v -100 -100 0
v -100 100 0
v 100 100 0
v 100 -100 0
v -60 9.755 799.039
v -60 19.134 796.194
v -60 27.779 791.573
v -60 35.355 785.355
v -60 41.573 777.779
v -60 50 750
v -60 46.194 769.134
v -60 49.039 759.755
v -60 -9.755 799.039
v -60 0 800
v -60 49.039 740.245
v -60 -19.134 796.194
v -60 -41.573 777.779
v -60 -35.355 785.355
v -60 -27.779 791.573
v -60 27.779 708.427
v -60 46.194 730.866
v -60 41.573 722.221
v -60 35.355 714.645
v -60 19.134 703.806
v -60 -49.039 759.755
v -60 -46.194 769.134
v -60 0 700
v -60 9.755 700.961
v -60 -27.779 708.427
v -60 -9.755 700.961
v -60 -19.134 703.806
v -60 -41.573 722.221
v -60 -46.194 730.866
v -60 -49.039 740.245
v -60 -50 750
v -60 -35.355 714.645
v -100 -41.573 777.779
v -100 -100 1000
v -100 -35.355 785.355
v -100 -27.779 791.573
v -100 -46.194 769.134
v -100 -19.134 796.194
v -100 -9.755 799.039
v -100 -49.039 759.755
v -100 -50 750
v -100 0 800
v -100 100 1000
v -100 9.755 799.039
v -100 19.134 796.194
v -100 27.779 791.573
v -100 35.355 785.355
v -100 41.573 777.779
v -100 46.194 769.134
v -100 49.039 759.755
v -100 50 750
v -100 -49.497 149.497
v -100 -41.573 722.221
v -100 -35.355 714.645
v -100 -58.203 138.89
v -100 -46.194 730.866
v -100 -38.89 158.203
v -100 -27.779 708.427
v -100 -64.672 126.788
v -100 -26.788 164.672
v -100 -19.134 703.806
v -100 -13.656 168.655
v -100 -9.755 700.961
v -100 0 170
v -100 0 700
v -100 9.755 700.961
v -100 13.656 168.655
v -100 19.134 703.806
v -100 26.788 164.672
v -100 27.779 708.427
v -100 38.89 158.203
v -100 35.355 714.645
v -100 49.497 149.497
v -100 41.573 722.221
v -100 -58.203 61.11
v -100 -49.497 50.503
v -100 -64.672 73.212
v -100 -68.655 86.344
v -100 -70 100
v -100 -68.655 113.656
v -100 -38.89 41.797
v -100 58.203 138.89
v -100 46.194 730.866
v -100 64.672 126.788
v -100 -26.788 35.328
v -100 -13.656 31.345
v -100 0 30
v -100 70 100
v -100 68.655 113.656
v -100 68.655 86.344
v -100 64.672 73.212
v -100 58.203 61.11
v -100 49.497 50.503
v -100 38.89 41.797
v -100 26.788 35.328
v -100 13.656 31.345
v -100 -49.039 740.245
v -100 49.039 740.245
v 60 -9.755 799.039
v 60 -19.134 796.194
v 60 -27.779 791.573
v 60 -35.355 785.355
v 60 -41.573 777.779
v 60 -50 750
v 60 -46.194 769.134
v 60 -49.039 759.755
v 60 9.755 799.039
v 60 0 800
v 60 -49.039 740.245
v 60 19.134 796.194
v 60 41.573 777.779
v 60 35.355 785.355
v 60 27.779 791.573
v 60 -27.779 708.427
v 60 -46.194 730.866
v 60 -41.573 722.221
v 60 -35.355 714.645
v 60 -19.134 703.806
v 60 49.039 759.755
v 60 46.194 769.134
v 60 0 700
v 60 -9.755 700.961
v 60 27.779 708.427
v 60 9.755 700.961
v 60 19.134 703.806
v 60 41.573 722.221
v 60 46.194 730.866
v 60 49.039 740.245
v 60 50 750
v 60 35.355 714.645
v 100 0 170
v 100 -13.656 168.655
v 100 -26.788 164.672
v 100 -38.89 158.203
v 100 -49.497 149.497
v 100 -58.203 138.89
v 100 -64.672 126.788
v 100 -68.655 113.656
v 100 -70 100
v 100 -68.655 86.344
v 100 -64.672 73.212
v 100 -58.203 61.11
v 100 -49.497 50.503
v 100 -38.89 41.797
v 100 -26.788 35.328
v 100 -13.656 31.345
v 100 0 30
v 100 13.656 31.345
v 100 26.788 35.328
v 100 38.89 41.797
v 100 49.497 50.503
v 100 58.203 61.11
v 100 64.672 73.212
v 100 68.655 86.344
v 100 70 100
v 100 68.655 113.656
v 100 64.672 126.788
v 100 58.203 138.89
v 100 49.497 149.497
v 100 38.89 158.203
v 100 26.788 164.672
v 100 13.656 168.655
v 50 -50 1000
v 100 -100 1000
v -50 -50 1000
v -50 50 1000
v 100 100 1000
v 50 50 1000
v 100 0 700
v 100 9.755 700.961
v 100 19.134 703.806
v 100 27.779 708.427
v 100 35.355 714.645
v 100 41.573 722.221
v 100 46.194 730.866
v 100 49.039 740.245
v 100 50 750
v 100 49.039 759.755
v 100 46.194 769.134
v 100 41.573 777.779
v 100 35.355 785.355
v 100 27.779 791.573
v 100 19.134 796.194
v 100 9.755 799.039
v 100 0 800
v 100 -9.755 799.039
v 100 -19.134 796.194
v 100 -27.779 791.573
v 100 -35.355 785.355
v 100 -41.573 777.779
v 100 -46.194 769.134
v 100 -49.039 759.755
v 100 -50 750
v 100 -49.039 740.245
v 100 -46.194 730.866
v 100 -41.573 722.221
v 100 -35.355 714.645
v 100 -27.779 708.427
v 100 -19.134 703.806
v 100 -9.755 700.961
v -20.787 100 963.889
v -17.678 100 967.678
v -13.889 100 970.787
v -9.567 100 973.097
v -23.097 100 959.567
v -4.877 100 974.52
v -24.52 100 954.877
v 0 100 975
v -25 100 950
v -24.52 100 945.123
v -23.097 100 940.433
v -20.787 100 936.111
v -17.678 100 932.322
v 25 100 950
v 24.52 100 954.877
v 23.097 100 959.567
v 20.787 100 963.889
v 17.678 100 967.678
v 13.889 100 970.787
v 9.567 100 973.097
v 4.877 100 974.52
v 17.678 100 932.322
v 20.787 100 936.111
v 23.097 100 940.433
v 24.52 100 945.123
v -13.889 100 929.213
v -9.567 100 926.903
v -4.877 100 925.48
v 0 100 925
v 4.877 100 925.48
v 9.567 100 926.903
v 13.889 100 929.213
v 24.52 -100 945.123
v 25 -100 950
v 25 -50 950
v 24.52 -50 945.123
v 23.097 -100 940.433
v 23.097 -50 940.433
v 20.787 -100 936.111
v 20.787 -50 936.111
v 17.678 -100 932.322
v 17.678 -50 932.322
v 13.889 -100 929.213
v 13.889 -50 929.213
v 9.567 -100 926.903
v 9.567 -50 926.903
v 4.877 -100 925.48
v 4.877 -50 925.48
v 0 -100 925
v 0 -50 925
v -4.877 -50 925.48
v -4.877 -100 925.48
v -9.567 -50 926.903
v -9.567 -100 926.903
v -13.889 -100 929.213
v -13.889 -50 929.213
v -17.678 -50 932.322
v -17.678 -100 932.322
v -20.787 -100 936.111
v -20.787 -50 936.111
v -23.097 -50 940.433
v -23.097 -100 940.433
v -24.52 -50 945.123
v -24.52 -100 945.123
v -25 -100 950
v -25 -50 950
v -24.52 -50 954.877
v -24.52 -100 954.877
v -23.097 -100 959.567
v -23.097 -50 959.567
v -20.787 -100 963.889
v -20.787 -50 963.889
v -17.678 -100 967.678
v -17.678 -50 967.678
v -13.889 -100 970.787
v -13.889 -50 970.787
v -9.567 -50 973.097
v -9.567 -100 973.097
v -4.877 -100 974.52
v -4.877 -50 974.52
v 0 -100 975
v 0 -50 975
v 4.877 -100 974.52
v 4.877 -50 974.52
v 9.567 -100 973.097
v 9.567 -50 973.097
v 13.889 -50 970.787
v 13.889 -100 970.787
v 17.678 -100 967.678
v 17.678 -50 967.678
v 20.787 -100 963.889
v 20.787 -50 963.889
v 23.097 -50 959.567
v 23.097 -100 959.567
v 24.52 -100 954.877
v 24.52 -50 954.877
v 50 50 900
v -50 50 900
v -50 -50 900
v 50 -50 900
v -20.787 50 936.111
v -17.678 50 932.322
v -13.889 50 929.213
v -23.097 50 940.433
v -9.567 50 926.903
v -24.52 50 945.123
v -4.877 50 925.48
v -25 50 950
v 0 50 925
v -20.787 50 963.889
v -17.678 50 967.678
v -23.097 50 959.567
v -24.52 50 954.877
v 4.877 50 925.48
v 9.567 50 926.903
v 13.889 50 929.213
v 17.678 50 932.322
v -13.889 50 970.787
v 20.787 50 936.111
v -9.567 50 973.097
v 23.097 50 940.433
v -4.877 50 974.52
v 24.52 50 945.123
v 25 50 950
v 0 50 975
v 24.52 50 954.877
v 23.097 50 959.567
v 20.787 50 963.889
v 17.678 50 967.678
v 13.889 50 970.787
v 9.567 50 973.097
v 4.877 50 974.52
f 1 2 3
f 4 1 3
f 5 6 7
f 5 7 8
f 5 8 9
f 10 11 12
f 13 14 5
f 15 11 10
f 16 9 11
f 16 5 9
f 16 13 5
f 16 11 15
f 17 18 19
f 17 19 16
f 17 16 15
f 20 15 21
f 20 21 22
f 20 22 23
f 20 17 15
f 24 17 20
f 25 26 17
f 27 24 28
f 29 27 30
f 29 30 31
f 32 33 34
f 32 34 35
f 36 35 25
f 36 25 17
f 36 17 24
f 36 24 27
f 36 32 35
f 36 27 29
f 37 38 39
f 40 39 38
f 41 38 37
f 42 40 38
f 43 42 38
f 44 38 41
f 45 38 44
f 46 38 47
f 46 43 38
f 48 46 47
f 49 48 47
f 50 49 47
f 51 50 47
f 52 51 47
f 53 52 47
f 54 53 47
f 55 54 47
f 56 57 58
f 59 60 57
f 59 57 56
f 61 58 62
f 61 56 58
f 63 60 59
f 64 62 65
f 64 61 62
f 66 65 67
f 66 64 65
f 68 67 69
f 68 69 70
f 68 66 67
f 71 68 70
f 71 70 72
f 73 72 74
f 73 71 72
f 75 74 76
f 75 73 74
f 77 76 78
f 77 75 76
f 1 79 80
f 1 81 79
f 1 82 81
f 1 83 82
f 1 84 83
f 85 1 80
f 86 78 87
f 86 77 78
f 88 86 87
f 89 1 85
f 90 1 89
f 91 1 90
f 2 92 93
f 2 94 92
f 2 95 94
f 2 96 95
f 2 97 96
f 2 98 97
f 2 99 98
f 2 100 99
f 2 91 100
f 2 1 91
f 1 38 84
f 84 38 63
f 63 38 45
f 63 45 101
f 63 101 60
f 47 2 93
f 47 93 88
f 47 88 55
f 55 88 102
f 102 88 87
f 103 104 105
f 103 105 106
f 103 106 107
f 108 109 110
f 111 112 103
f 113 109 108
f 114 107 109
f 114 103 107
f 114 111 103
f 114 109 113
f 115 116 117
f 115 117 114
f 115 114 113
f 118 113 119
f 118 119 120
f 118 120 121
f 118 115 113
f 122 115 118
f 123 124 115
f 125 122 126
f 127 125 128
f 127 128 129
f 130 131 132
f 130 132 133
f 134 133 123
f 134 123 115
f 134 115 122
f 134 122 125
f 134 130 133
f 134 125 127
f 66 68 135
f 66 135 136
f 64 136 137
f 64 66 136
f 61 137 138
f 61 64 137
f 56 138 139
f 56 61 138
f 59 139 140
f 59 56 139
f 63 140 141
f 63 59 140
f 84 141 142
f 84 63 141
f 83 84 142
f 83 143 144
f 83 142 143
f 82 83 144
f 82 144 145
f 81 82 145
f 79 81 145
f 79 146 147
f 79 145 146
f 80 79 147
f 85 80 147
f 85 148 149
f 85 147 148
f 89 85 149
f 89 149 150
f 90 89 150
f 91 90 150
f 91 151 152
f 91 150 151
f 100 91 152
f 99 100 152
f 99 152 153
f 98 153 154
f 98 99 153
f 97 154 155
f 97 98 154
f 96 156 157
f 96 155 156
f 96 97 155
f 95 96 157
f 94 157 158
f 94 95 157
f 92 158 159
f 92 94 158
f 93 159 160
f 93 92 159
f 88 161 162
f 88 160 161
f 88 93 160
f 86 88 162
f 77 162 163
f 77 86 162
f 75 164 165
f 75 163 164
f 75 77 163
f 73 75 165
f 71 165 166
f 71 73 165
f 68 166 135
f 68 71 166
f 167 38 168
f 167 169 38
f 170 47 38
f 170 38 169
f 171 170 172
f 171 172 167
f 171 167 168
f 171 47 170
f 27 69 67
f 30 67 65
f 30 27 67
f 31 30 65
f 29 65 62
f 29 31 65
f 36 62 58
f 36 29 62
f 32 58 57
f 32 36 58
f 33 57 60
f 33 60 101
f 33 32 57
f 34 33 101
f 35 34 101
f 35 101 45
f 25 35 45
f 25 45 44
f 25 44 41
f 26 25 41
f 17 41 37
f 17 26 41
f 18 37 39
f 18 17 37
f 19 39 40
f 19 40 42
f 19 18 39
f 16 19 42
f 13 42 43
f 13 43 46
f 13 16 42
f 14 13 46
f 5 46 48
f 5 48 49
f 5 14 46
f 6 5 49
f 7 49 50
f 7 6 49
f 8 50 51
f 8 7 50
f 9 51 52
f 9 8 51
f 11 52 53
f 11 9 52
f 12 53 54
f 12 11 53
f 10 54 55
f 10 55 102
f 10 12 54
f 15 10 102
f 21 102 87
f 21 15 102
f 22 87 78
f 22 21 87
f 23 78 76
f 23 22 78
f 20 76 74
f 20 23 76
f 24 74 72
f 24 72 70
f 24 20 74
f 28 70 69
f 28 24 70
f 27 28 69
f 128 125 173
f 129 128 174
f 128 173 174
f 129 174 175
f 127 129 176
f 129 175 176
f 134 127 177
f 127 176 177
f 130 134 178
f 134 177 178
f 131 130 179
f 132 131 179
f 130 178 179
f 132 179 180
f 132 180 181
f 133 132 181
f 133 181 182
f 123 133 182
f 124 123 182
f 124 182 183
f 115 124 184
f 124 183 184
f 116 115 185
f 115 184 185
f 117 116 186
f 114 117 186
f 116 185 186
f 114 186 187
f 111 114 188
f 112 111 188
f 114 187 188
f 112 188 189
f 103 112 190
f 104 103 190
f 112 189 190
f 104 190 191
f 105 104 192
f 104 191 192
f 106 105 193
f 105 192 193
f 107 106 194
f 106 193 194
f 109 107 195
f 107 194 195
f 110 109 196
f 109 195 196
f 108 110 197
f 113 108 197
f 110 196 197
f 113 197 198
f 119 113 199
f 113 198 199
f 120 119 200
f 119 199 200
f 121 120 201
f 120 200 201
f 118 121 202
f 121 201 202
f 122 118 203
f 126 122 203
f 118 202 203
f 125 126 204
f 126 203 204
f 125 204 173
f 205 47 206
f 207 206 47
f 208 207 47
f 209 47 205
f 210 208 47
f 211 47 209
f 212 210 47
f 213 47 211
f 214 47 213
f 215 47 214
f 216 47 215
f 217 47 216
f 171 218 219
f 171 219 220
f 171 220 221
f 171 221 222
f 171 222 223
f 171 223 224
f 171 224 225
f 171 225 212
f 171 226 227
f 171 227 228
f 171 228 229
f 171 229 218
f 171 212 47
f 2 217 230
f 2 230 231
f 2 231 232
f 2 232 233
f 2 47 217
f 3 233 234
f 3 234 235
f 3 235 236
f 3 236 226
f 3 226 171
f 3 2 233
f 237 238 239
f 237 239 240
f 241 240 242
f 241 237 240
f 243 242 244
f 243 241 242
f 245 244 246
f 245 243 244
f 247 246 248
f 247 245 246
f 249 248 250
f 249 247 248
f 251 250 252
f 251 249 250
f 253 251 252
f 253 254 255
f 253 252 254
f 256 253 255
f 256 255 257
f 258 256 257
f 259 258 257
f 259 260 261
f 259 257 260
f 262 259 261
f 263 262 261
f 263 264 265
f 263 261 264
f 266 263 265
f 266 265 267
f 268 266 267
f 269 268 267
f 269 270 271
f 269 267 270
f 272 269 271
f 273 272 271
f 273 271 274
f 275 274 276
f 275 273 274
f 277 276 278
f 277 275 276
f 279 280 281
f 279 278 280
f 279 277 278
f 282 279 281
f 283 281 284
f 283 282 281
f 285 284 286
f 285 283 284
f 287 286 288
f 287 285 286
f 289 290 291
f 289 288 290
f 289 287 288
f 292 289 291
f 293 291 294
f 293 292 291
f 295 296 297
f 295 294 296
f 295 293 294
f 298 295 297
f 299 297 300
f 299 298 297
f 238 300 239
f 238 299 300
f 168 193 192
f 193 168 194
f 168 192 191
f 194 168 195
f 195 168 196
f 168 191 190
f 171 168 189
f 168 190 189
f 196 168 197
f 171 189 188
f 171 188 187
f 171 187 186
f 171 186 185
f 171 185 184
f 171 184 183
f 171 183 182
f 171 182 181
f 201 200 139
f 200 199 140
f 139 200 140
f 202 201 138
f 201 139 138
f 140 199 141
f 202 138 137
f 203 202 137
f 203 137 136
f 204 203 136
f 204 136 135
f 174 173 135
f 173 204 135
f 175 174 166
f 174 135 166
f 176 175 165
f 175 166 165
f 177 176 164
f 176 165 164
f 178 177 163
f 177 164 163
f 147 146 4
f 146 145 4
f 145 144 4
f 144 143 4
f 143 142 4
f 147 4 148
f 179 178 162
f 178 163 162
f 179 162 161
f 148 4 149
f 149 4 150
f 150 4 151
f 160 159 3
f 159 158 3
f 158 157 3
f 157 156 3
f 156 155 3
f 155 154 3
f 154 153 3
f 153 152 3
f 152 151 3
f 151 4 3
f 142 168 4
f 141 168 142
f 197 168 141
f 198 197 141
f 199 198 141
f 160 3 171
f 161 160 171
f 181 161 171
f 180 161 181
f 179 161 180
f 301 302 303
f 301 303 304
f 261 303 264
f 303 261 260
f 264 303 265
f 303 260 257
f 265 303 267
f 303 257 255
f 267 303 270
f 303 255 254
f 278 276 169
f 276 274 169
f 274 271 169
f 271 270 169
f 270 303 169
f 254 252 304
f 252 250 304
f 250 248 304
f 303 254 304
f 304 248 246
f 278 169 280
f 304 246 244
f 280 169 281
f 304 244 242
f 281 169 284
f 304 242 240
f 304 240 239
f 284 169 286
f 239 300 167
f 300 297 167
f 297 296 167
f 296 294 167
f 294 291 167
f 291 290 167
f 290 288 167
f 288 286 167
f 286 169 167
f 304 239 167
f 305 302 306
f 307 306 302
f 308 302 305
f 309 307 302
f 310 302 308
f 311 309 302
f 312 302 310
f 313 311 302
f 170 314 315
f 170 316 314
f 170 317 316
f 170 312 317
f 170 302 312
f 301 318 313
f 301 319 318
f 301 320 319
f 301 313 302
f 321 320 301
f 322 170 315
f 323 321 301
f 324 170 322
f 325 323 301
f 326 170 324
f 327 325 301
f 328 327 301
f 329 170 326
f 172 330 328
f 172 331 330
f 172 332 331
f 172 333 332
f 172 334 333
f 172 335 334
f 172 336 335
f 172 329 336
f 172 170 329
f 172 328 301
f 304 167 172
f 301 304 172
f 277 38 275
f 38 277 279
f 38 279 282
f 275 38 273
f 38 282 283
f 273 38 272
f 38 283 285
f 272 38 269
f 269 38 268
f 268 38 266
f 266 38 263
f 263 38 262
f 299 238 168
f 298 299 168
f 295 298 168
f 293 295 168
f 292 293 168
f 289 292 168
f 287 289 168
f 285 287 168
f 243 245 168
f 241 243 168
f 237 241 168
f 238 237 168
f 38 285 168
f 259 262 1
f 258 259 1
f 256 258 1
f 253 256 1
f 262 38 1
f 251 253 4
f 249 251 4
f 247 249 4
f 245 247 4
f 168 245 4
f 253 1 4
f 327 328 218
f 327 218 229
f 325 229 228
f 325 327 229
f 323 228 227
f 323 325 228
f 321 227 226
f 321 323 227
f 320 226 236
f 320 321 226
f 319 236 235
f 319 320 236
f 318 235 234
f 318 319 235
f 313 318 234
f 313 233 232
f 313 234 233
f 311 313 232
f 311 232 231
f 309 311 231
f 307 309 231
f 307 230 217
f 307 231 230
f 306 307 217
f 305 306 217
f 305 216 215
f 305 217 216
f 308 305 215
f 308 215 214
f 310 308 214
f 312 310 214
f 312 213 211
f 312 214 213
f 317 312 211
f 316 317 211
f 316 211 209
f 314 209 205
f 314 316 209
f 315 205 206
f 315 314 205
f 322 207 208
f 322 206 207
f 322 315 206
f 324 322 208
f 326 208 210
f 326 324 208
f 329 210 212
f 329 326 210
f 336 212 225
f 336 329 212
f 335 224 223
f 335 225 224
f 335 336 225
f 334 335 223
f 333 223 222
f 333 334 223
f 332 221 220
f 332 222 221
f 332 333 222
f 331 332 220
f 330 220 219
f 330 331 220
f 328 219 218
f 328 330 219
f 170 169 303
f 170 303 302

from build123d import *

# Parameters (mm, degrees)
SKETCH1_W               = 200
SKETCH1_H               = 200
BOSS_EXTRUDE1_DEPTH     = 1000
CUT_EXTRUDE1_DEPTH      = 100
CUT_EXTRUDE1_DEPTH_BACK = 300
SKETCH2_R               = 70
SKETCH3_W               = 100
SKETCH3_H               = 100
CUT_EXTRUDE2_DEPTH      = 100
CUT_EXTRUDE3_DEPTH      = 183
CUT_EXTRUDE3_DEPTH_BACK = 100
SKETCH4_R               = 25
SKETCH5_R               = 50
CUT_EXTRUDE4_DEPTH      = 40
CUT_EXTRUDE5_START      = -40
SKETCH6_R               = 50
CUT_EXTRUDE5_DEPTH      = 40


with BuildPart() as part:
    # Sketch1 → Boss-Extrude1 (new body)
    with BuildSketch(Plane.XY):
        Rectangle(SKETCH1_W, SKETCH1_H)
    extrude(amount=BOSS_EXTRUDE1_DEPTH)

    # Sketch2 → Cut-Extrude1 (cut, two sides: drawn at the far end of the back side and taken through both)
    with BuildSketch(Plane(origin=(100, 0, 0), x_dir=(0, 0, -1), z_dir=(1, 0, 0)).offset(-CUT_EXTRUDE1_DEPTH_BACK)):
        with Locations(Location((-100, 0, 0), (0, 0, 180))):
            Circle(SKETCH2_R)
    extrude(amount=CUT_EXTRUDE1_DEPTH + CUT_EXTRUDE1_DEPTH_BACK, mode=Mode.SUBTRACT)

    # Sketch3 → Cut-Extrude2 (cut)
    with BuildSketch(Plane.XY.offset(1000)):
        Rectangle(SKETCH3_W, SKETCH3_H)
    extrude(amount=-CUT_EXTRUDE2_DEPTH, mode=Mode.SUBTRACT)

    # Sketch4 → Cut-Extrude3 (cut, two sides: drawn at the far end of the back side and taken through both)
    with BuildSketch(Plane(origin=(0, -50, 0), x_dir=(1, 0, 0), z_dir=(0, 1, 0)).offset(-CUT_EXTRUDE3_DEPTH_BACK)):
        with Locations((0, -950)):
            Circle(SKETCH4_R)
    extrude(amount=CUT_EXTRUDE3_DEPTH + CUT_EXTRUDE3_DEPTH_BACK, mode=Mode.SUBTRACT)

    # Sketch5 → Cut-Extrude4 (cut)
    with BuildSketch(Plane(origin=(100, 0, 0), x_dir=(0, 0, -1), z_dir=(1, 0, 0))):
        with Locations((-750, 0)):
            Circle(SKETCH5_R)
    extrude(amount=-CUT_EXTRUDE4_DEPTH, mode=Mode.SUBTRACT)

    # Sketch6 → Cut-Extrude5 (cut)
    with BuildSketch(Plane.ZY.offset(100).offset(CUT_EXTRUDE5_START)):
        with Locations(Location((750, 0, 0), (0, 0, 180))):
            Circle(SKETCH6_R)
    extrude(amount=CUT_EXTRUDE5_DEPTH, mode=Mode.SUBTRACT)


solid = part.part
